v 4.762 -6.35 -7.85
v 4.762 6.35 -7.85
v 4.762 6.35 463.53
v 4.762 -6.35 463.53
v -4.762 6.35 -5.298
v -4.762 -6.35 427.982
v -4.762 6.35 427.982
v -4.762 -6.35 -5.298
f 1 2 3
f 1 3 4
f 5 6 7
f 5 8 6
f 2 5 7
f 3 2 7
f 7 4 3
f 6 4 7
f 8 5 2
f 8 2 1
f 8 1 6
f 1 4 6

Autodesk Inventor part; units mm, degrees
ref_plane "Start plane" through (0, 0, -7.8501) normal (0, 0, 1) x (1, 0, 0)
ref_plane "End plane" through (0, 0, 463.5299) normal (0, 0, 1) x (1, 0, 0)
sketch "Sketch" plane through (0, 0, 0) normal (0, 0, 1) x (1, 0, 0)
  line L0 (4.7625, -6.35) -> (-4.7625, -6.35)
  line L1 (-4.7625, -6.35) -> (-4.7625, 6.35)
  line L2 (-4.7625, 6.35) -> (4.7625, 6.35)
  line L3 (4.7625, 6.35) -> (4.7625, -6.35)
  line L4 (-6, 0) -> (8, 0) construction
  line L5 (0, -30) -> (0, 40) construction
  line L6 (0, 54) -> (0, -44) construction
  line L7 (-9.2, 0) -> (13.2, 0) construction
  dimension "d0" = 12.7
  dimension "d1" = 9.525
  dimension "d4" = 4.7625
  dimension "d5" = 6.35
extrude "Body" add sketch "Sketch" along normal up to surface (471.38 mm away) from surface at -7.8501
sketch "Sketch3" plane through (0, 0, 0) normal (0, 0, 1) x (1, 0, 0)
  line L0 (0, 0) -> (10, 0)
ref_plane "Work Plane3" through (0, 0, 0) normal (0, -1, 0) x (1, 0, 0)
sketch "Sketch4" plane through (0, 0, 0) normal (0, -1, 0) x (1, 0, 0)
  line L0 (-2, -7.8501) -> (12, -7.8501)
  line L1 (-2, 463.5299) -> (12, 463.5299)
  dimension "d9" = 471.38
ref_plane "Work Plane7" through (-113.0825, 0, 23.7264) normal (-0.2588, 0, -0.9659) x (-0.9659, 0, 0.2588)
split "Split4" plane through (-113.0825, 0, 23.7264) removes the side toward (-0.2588, 0, -0.9659)
ref_plane "Work Plane8" through (41.265, -6.35, 599.759) normal (-0.9659, 0, 0.2588) x (0.2588, 0, 0.9659)
split "Split5" plane through (41.265, -6.35, 599.759) removes the side toward (-0.9659, 0, 0.2588)
equation "\"d0\" = G_W"
equation "\"d1\" = G_H"
equation "\"d4\" = 0.5 * d1"
equation "\"d5\" = 0.5 * d0"
equation "\"d2\" = G_L"
equation "\"G_W\" = 12.7"
equation "\"G_H\" = 9.525"
equation "\"G_L\" = d9"
equation "\"G_OFFSET_START\" = 7.85011"
equation "\"G_OFFSET_END\" = -6.76062"
equation "\"d6\" = -G_OFFSET_START"
equation "\"d7\" = G_OFFSET_END + B_L"
equation "\"B_L\" = 470.29055"
properties part number "AISC - 1/2x3/8 - 18.558" material "Steel, Alloy"
